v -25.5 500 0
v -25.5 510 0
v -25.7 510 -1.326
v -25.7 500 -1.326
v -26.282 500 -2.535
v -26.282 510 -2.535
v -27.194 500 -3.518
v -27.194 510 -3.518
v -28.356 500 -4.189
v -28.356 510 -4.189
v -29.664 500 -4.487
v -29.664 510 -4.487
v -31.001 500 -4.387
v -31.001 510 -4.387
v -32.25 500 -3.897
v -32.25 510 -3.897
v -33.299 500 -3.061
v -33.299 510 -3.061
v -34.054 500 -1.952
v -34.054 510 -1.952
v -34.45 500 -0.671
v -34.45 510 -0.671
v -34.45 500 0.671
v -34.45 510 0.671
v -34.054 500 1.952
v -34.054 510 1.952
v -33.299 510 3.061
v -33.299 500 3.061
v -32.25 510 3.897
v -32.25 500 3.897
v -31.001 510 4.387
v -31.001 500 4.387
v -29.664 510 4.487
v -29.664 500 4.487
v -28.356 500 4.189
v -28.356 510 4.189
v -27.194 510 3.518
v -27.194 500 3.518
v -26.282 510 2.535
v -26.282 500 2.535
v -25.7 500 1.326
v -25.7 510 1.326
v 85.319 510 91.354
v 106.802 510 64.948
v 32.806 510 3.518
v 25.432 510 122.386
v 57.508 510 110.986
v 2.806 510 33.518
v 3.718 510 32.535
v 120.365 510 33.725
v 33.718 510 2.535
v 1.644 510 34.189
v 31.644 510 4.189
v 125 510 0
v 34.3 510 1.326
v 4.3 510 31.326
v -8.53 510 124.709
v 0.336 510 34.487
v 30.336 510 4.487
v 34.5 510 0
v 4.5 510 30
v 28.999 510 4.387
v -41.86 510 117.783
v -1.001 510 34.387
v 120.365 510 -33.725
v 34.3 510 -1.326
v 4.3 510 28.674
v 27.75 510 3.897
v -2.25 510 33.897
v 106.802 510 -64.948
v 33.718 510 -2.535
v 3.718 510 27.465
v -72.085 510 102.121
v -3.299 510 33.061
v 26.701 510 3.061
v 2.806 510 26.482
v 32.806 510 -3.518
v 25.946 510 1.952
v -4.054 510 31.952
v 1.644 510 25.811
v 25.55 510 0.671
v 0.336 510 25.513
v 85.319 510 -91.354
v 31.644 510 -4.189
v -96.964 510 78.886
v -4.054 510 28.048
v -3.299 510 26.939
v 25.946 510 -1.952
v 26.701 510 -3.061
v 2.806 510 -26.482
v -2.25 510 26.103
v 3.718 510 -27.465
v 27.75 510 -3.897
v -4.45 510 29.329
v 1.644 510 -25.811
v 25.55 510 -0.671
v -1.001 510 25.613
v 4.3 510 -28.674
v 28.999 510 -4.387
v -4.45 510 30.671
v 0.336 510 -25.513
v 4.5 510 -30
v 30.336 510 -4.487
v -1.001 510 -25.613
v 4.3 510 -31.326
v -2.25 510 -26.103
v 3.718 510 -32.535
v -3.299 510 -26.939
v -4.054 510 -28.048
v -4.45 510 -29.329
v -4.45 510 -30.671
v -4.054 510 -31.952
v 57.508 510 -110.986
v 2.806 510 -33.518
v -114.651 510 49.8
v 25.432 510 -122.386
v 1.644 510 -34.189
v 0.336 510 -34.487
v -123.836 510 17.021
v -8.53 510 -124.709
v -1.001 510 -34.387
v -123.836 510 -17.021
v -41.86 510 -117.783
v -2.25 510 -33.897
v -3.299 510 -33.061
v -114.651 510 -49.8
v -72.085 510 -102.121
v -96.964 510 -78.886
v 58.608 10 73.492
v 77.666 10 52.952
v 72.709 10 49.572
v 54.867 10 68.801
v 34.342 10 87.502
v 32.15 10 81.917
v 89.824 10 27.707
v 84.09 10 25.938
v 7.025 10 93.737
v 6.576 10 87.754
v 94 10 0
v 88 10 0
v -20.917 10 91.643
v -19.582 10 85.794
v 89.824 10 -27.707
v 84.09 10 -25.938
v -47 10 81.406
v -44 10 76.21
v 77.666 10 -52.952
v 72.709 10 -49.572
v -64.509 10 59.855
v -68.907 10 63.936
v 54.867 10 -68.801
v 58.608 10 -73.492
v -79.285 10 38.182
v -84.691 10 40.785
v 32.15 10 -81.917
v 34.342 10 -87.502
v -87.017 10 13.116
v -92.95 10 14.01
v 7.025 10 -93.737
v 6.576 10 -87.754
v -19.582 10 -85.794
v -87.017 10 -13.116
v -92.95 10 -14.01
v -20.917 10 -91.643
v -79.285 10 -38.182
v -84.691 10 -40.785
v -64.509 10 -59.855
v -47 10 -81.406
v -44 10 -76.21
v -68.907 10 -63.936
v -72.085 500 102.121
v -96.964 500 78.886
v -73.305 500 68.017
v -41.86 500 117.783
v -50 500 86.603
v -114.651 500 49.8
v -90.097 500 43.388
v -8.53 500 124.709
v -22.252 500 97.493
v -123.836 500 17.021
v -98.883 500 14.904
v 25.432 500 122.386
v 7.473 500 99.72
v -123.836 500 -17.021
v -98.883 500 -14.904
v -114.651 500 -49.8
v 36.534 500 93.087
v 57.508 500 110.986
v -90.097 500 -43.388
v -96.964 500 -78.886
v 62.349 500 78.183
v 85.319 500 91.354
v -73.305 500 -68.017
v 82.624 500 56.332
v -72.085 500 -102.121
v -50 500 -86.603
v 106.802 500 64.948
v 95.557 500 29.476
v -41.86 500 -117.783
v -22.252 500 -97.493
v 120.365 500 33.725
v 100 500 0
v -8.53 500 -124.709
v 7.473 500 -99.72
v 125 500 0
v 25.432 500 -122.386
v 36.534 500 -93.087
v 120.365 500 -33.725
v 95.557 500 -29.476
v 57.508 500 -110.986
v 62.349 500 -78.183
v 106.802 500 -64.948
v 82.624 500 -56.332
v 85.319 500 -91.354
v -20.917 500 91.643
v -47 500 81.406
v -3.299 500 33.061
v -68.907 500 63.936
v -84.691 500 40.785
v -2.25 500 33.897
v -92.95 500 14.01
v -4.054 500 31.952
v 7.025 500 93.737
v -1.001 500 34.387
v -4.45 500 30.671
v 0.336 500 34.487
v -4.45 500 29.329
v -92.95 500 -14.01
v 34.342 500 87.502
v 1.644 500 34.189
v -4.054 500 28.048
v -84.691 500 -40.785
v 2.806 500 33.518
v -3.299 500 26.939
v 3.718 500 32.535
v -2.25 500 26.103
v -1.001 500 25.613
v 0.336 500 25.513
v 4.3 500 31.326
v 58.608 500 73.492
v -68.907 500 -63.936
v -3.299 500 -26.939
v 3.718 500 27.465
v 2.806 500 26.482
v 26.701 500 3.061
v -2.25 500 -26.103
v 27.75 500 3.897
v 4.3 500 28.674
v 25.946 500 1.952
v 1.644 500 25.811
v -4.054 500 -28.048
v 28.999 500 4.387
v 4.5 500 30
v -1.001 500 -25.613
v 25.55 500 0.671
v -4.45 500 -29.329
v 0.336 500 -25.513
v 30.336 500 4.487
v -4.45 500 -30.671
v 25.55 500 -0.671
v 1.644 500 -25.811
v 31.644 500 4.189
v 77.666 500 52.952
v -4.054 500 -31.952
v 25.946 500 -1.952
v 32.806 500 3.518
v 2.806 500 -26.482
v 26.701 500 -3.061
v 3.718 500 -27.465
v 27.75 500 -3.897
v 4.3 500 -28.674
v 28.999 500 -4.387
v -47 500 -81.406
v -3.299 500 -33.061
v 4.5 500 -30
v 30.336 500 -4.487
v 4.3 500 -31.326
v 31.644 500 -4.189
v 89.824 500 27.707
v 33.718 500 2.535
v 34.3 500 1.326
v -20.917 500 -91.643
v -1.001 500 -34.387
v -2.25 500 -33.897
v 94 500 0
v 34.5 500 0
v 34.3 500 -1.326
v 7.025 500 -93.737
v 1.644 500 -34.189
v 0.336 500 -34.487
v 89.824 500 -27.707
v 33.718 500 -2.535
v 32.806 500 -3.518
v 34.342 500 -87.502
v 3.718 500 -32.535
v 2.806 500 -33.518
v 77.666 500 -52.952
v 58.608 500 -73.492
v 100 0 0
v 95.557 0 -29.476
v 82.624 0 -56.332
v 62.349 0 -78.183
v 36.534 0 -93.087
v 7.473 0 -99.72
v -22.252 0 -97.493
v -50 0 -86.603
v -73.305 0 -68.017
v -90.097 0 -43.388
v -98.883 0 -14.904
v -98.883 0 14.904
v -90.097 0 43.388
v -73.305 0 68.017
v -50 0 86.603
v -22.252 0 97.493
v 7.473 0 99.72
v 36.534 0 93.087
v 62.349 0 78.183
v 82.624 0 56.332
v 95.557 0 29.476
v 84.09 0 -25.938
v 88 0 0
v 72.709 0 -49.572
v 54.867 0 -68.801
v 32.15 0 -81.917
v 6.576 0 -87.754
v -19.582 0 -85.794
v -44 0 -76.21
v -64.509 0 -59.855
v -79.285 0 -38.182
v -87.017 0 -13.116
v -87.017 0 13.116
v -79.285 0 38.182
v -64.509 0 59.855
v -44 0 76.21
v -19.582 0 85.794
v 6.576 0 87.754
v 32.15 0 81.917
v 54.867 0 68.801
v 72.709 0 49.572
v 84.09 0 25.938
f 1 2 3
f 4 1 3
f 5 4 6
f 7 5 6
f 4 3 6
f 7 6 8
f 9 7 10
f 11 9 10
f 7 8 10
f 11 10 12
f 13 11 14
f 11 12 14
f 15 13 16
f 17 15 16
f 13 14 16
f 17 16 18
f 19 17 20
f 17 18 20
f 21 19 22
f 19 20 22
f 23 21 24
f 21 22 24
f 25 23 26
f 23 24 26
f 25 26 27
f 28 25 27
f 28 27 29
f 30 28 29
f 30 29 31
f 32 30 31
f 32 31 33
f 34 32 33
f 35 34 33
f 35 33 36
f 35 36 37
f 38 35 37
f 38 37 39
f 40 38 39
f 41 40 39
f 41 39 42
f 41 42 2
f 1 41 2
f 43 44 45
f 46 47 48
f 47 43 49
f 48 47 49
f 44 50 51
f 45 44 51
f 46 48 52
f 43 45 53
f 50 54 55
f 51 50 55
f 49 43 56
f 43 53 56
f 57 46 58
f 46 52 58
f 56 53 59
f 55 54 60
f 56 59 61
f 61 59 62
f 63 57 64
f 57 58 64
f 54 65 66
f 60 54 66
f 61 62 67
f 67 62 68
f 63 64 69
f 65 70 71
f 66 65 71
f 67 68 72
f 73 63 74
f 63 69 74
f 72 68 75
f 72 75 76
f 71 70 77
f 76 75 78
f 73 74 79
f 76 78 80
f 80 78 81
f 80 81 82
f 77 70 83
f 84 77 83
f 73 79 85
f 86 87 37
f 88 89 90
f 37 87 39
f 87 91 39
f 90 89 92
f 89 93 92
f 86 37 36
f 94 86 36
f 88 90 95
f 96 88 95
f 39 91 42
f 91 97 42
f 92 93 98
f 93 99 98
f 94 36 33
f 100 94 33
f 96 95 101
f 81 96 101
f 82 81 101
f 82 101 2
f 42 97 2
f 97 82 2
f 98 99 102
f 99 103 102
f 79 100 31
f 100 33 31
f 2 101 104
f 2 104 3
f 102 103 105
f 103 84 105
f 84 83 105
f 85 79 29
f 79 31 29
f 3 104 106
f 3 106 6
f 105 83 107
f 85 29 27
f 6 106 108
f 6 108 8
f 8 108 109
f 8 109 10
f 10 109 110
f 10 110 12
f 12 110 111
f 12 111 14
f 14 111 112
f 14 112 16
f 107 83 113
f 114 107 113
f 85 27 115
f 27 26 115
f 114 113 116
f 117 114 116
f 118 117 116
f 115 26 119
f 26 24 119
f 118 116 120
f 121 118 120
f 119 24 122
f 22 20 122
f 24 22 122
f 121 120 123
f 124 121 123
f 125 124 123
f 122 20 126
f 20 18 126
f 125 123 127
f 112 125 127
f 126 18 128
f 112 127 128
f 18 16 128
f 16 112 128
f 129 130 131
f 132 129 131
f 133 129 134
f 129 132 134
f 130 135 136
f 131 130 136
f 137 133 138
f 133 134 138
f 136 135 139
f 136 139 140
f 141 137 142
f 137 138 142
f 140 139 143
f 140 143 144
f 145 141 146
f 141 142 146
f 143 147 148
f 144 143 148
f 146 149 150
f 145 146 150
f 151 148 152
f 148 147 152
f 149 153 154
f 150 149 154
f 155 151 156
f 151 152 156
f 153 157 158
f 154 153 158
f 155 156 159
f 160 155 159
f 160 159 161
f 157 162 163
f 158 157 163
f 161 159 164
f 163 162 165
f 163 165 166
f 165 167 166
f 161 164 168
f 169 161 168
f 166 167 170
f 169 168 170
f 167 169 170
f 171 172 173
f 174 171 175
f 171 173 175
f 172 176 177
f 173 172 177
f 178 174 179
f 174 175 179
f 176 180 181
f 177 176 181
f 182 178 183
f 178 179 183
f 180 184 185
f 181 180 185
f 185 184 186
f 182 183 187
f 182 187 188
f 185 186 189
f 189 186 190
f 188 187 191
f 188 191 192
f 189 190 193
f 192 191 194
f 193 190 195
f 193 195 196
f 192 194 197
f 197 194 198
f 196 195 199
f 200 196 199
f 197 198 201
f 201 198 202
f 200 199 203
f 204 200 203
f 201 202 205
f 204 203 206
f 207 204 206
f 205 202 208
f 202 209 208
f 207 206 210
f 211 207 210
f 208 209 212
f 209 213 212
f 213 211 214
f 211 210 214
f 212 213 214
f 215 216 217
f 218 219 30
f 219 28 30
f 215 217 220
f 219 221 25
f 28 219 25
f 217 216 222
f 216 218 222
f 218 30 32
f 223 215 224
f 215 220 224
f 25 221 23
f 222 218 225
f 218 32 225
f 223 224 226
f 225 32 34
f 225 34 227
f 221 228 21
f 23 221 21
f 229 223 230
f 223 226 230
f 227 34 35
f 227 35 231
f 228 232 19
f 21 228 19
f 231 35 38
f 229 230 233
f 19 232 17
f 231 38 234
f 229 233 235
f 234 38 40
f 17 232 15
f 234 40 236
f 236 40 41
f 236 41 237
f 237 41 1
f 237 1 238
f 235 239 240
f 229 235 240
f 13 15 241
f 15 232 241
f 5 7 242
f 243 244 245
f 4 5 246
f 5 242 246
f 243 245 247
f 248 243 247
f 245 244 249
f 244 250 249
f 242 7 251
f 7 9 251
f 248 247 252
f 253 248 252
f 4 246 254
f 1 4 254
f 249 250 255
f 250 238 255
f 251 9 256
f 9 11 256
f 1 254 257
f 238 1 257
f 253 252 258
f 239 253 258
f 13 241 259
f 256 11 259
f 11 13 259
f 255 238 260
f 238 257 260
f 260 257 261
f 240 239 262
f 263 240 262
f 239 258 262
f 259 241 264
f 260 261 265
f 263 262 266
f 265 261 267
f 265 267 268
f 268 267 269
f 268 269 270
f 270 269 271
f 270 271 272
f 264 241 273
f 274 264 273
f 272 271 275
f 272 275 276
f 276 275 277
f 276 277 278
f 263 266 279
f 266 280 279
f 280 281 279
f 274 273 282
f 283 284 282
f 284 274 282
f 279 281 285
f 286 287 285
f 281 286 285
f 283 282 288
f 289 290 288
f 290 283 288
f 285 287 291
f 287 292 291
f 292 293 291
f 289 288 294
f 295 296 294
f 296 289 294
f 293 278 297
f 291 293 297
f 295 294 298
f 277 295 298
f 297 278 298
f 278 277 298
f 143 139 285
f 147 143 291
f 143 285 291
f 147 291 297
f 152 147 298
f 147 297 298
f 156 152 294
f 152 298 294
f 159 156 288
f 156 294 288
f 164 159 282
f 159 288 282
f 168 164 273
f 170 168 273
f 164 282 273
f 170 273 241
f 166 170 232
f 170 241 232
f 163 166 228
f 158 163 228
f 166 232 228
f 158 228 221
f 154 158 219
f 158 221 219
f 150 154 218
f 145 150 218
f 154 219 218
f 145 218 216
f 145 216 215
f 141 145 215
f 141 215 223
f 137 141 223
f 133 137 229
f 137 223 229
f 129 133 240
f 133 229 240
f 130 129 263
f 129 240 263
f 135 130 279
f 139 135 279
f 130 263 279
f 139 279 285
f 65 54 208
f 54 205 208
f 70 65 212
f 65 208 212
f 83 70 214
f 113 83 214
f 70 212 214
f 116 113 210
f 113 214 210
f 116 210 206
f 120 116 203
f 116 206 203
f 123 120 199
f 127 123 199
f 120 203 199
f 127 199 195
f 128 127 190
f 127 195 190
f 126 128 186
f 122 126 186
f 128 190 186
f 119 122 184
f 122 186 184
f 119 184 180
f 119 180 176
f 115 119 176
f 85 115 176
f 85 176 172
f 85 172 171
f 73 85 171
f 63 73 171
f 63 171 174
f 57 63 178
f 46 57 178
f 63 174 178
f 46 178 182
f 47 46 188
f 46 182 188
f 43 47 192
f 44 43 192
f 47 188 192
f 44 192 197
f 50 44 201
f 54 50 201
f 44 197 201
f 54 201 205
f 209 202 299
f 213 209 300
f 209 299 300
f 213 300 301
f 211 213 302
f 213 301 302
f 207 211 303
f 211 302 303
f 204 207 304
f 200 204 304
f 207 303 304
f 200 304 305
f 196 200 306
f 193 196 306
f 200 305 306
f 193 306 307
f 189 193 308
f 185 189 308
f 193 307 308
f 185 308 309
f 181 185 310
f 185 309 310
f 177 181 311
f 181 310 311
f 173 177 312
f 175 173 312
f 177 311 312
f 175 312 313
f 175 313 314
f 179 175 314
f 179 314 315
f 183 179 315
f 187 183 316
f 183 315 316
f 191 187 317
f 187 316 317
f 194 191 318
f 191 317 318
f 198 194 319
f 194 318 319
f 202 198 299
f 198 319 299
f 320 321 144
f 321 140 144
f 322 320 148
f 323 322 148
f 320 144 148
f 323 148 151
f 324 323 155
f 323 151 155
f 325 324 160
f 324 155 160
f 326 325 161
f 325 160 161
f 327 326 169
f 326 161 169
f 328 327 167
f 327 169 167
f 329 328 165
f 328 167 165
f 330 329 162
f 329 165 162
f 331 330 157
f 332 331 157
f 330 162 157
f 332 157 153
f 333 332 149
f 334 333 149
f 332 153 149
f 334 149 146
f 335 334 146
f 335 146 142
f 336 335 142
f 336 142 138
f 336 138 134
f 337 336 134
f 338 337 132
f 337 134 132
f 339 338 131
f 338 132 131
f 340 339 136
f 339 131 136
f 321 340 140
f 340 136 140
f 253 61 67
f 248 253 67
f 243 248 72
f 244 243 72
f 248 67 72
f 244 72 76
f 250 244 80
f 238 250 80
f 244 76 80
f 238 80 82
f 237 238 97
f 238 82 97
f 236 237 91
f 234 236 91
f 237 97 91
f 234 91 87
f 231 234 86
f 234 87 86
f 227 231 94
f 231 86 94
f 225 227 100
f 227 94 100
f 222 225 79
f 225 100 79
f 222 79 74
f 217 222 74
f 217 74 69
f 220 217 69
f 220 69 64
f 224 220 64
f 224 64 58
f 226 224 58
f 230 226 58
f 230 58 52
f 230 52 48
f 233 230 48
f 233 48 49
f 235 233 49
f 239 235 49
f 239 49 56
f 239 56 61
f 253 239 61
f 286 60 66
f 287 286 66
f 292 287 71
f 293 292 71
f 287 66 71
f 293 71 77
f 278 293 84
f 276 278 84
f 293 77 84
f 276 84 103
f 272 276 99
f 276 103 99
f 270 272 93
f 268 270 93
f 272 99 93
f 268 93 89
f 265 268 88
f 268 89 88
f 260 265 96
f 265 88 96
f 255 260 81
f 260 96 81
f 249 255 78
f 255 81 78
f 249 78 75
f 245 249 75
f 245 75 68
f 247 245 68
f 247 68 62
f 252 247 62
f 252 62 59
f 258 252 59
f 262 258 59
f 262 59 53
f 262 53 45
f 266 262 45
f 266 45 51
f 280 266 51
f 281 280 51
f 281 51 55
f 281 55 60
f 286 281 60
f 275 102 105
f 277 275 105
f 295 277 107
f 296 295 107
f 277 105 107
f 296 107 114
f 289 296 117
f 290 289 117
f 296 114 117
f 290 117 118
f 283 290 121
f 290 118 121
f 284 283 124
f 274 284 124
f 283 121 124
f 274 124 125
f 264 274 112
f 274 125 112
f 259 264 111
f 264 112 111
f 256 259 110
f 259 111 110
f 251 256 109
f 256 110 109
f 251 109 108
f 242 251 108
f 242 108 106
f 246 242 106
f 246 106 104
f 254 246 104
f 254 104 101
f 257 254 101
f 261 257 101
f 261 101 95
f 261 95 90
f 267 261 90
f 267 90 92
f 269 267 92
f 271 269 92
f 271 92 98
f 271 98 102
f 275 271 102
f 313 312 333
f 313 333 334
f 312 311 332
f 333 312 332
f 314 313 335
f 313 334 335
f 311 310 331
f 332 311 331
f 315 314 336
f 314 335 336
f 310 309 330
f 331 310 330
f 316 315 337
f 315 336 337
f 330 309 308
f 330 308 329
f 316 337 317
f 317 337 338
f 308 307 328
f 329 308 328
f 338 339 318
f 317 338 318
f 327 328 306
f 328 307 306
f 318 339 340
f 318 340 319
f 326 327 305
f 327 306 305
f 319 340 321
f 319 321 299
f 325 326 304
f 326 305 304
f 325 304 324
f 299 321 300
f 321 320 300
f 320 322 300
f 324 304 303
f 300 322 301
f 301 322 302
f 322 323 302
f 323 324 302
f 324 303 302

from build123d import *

# Parameters (mm, degrees)
CORTE_EXTRUS_O1_REACH = 512
ESBO_O2_R             = 4.5


with BuildPart() as part:
    # Esboço1 → Revolução1 (revolve)
    with BuildSketch(Plane.XY):
        Polygon((0, 510), (125, 510), (125, 500), (100, 500), (100, 0), (88, 0), (88, 10), (94, 10), (94, 500), (0, 500), align=None)
    revolve(axis=Axis((0, 0, 0), (0, 1, 0)))

    # Esboço2 → Corte-extrusão1 (cut, up to next)
    with BuildSketch(Plane(origin=(0, 510, 0), x_dir=(1, 0, 0), z_dir=(0, 1, 0)), mode=Mode.PRIVATE) as corte_extrus_o1_sk1:
        with Locations((0, 30)):
            Circle(ESBO_O2_R)
    corte_extrus_o1_tool1 = extrude(corte_extrus_o1_sk1.sketch, amount=-CORTE_EXTRUS_O1_REACH, mode=Mode.PRIVATE) & part.part
    add(corte_extrus_o1_tool1.solids().sort_by_distance((0, 510, -30))[0], mode=Mode.SUBTRACT)
    # Esboço2 → Corte-extrusão1 (cut, up to next)
    with BuildSketch(Plane(origin=(0, 510, 0), x_dir=(1, 0, 0), z_dir=(0, 1, 0)), mode=Mode.PRIVATE) as corte_extrus_o1_sk2:
        with Locations((30, 0)):
            Circle(ESBO_O2_R)
    corte_extrus_o1_tool2 = extrude(corte_extrus_o1_sk2.sketch, amount=-CORTE_EXTRUS_O1_REACH, mode=Mode.PRIVATE) & part.part
    add(corte_extrus_o1_tool2.solids().sort_by_distance((30, 510, 0))[0], mode=Mode.SUBTRACT)
    # Esboço2 → Corte-extrusão1 (cut, up to next)
    with BuildSketch(Plane(origin=(0, 510, 0), x_dir=(1, 0, 0), z_dir=(0, 1, 0)), mode=Mode.PRIVATE) as corte_extrus_o1_sk3:
        with Locations((0, -30)):
            Circle(ESBO_O2_R)
    corte_extrus_o1_tool3 = extrude(corte_extrus_o1_sk3.sketch, amount=-CORTE_EXTRUS_O1_REACH, mode=Mode.PRIVATE) & part.part
    add(corte_extrus_o1_tool3.solids().sort_by_distance((0, 510, 30))[0], mode=Mode.SUBTRACT)
    # Esboço2 → Corte-extrusão1 (cut, up to next)
    with BuildSketch(Plane(origin=(0, 510, 0), x_dir=(1, 0, 0), z_dir=(0, 1, 0)), mode=Mode.PRIVATE) as corte_extrus_o1_sk4:
        with Locations((-30, 0)):
            Circle(ESBO_O2_R)
    corte_extrus_o1_tool4 = extrude(corte_extrus_o1_sk4.sketch, amount=-CORTE_EXTRUS_O1_REACH, mode=Mode.PRIVATE) & part.part
    add(corte_extrus_o1_tool4.solids().sort_by_distance((-30, 510, 0))[0], mode=Mode.SUBTRACT)


solid = part.part
